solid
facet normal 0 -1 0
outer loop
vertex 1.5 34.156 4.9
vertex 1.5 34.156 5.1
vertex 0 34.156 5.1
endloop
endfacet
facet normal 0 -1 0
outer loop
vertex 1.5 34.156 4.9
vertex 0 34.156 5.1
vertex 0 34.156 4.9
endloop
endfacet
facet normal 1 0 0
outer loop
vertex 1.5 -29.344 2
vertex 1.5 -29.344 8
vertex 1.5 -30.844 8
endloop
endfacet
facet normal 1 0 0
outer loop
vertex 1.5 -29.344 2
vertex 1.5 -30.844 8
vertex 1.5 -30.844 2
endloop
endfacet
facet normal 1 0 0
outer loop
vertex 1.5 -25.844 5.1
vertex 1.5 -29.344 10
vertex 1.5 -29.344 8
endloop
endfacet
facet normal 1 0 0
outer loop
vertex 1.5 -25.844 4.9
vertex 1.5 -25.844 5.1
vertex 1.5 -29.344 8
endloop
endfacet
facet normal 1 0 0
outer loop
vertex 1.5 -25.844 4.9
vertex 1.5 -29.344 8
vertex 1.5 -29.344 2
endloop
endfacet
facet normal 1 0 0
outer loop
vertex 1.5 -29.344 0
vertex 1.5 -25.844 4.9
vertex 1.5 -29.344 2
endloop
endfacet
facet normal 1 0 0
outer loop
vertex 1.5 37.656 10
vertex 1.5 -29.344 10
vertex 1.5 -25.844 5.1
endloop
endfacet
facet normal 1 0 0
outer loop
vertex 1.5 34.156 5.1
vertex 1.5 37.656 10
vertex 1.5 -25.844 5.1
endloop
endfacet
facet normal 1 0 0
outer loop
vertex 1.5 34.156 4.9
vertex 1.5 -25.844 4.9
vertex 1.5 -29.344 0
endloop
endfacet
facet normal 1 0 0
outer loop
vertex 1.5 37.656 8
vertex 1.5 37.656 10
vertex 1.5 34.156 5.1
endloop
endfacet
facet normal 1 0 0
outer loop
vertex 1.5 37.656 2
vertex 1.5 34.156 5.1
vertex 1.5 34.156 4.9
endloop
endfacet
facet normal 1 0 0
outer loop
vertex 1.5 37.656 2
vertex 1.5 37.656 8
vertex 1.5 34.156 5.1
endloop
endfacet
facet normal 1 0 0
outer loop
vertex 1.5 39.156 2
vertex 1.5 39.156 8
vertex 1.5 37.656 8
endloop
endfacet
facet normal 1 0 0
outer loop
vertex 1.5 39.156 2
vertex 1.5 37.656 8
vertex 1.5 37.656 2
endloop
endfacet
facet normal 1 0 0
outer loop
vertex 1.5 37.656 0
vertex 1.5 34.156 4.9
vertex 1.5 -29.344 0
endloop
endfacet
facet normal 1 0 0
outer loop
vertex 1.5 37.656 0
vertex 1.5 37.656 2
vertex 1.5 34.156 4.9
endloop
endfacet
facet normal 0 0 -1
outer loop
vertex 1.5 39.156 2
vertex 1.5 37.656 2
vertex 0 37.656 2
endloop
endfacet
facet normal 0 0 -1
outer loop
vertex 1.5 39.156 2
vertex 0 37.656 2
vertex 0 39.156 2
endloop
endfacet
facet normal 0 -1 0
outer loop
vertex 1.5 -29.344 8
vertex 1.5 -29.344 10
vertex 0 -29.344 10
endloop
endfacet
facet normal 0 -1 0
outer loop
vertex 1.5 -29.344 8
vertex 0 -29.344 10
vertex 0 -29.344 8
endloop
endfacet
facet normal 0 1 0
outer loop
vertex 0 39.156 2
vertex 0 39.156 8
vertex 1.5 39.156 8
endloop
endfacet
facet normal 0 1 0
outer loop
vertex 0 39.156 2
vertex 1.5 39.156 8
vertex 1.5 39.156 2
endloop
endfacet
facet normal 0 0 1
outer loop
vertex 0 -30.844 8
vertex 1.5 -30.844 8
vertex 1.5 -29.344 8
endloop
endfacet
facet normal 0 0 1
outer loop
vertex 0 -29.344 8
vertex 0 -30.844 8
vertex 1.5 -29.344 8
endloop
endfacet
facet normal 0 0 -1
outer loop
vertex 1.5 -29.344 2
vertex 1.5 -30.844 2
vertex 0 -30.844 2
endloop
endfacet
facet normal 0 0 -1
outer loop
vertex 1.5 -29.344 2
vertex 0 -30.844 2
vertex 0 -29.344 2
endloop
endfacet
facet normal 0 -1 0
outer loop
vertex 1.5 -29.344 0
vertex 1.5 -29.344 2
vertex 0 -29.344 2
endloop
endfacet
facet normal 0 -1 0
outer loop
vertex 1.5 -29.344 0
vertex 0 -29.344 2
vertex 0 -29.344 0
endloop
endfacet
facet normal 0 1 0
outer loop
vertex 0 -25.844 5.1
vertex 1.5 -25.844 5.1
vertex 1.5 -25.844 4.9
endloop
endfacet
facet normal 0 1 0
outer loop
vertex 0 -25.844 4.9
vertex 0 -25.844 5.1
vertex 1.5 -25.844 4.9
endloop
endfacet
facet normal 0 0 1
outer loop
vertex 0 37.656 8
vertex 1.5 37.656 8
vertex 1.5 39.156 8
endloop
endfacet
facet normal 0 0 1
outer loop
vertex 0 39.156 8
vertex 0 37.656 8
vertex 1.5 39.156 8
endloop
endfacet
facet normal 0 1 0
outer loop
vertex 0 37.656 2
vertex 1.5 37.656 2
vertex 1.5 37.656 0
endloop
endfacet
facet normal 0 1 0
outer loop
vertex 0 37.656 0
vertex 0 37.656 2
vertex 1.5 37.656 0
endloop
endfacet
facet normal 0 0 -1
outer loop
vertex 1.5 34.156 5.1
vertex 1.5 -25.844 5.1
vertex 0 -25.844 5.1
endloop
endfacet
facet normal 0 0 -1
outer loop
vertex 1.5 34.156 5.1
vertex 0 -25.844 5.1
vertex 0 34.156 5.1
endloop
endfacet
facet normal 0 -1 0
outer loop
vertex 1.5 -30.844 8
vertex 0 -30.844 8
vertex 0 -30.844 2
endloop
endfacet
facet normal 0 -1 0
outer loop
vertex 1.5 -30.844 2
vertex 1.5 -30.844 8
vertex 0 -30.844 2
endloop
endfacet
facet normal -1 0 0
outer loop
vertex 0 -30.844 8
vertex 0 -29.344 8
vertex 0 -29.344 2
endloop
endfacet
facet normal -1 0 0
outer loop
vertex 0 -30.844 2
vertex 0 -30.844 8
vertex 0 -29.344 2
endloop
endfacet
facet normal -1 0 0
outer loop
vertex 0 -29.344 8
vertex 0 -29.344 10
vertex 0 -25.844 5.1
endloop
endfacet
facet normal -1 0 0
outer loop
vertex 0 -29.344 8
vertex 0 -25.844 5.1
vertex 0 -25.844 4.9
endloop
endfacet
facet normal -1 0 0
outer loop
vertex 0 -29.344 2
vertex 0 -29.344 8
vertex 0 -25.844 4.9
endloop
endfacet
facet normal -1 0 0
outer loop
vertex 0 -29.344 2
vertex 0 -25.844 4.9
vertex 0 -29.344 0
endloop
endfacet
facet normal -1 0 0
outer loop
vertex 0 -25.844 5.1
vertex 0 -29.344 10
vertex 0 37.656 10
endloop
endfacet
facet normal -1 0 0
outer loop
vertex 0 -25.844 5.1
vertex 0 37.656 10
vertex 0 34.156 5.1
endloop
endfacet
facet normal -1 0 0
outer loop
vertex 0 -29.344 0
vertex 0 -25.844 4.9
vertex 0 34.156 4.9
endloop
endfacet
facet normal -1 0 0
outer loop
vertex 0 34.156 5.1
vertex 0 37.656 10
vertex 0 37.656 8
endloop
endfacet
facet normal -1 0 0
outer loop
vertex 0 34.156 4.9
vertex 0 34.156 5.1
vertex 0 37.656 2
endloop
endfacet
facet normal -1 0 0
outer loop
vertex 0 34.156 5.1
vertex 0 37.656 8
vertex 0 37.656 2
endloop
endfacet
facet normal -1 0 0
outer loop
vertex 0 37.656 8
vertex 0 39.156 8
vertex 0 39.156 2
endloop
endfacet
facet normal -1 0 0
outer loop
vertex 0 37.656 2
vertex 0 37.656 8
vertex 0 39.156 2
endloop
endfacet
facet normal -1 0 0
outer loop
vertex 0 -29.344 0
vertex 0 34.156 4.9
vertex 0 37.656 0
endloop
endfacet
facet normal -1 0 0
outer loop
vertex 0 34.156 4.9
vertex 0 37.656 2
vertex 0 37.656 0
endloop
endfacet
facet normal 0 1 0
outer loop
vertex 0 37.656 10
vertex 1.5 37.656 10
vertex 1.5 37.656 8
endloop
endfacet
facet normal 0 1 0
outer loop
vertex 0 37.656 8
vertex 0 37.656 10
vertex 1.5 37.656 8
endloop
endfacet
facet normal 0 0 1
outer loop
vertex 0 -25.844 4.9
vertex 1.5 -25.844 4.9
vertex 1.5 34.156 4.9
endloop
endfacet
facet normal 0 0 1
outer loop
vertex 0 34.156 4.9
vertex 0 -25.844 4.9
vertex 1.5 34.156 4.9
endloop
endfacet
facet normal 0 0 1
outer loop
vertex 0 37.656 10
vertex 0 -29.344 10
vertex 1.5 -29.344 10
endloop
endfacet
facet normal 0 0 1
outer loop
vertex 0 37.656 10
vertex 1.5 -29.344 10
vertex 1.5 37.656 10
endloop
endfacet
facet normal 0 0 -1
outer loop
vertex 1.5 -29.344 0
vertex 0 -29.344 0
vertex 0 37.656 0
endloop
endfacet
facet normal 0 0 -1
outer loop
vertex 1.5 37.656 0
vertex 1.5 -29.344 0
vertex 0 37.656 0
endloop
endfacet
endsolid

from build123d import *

# Parameters (mm, degrees)
SKETCH1_W           = 10
SKETCH1_H           = 70
BOSS_EXTRUDE1_DEPTH = 1.5
SKETCH2_W           = 2
SKETCH2_H           = 1.5
CUT_EXTRUDE1_DEPTH  = 10
SKETCH3_W           = 0.2
SKETCH3_H           = 60
CUT_EXTRUDE2_DEPTH  = 10


with BuildPart() as part:
    # Sketch1 → Boss-Extrude1 (new body)
    with BuildSketch(Plane(origin=(0, 0, 0), x_dir=(0, 0, -1), z_dir=(1, 0, 0))):
        with Locations((-5, 4.155844156)):
            Rectangle(SKETCH1_W, SKETCH1_H)
    extrude(amount=BOSS_EXTRUDE1_DEPTH)

    # Sketch2 → Cut-Extrude1 (cut)
    with BuildSketch(Plane(origin=(1.5, 0, 0), x_dir=(0, 0, -1), z_dir=(1, 0, 0))):
        with Locations((-9, 38.405844156)):
            Rectangle(SKETCH2_W, SKETCH2_H)
        with Locations((-1, 38.405844156)):
            Rectangle(SKETCH2_W, SKETCH2_H)
        with Locations((-1, -30.094155844)):
            Rectangle(SKETCH2_W, SKETCH2_H)
        with Locations((-9, -30.094155844)):
            Rectangle(SKETCH2_W, SKETCH2_H)
    extrude(amount=-CUT_EXTRUDE1_DEPTH, mode=Mode.SUBTRACT)

    # Sketch3 → Cut-Extrude2 (cut)
    with BuildSketch(Plane(origin=(1.5, 0, 0), x_dir=(0, 0, -1), z_dir=(1, 0, 0))):
        with Locations((-5, 4.155844156)):
            Rectangle(SKETCH3_W, SKETCH3_H)
    extrude(amount=-CUT_EXTRUDE2_DEPTH, mode=Mode.SUBTRACT)


solid = part.part
